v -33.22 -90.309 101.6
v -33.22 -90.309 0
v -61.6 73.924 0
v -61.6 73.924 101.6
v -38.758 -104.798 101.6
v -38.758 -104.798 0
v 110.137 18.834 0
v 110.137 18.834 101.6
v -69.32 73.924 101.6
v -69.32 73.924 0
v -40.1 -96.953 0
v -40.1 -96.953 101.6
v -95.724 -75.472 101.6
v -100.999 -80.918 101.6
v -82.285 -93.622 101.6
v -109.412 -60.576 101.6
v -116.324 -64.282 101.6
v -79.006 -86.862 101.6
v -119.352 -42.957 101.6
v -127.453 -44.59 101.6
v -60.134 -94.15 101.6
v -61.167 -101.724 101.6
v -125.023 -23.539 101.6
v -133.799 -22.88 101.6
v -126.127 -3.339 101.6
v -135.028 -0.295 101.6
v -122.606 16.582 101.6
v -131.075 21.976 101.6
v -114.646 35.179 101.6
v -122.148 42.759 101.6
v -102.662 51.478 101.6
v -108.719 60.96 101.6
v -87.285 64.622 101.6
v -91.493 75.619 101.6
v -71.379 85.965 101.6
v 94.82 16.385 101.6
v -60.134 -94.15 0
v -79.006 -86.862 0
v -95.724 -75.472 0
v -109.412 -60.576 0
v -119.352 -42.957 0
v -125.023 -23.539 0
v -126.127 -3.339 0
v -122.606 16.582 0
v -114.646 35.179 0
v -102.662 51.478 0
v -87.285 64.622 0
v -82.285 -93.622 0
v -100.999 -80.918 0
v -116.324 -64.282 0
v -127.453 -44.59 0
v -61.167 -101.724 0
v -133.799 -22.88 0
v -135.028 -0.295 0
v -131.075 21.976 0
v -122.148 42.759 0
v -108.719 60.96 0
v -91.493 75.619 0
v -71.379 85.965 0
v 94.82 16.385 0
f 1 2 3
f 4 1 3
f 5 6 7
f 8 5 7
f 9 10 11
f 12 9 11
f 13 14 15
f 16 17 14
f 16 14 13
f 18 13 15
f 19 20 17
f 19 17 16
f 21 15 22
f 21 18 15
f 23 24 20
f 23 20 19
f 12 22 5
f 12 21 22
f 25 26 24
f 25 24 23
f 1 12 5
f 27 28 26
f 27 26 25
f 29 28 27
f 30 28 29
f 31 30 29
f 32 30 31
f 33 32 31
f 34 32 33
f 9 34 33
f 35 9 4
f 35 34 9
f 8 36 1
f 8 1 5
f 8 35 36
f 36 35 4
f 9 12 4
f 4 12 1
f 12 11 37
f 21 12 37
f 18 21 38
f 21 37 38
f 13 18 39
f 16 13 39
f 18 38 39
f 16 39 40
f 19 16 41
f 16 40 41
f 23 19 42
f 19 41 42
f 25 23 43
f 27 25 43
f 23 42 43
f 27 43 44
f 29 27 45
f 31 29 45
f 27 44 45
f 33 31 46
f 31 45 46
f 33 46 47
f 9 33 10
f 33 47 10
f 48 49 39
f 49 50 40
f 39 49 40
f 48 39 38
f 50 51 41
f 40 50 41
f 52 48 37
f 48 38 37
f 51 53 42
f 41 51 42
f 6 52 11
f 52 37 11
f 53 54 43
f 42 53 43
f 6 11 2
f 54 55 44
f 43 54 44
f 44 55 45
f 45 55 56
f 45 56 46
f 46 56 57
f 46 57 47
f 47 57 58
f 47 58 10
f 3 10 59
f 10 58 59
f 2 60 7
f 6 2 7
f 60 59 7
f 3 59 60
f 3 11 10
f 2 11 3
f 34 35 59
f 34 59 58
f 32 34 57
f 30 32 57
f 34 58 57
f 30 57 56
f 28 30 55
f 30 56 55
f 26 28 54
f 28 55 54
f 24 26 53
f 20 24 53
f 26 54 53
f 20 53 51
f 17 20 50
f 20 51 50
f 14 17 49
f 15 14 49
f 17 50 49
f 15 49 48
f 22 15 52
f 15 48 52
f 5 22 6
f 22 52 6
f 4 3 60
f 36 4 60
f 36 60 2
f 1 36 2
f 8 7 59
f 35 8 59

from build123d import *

# Parameters (mm, degrees)
F1_DEPTH = 101.6


with BuildPart() as f1:
    # F0 (on Top) → F1 (new body)
    with BuildSketch(Plane.XY):
        Polygon((-38.758028, -104.798459), (110.137142, 18.833792), (-71.379113, 85.964666), (-69.320055, 73.923605), (-40.099562, -96.953376), align=None)
        Polygon((-61.59973, 73.923605), (94.819585, 16.385128), (-33.219855, -90.308734), align=None, mode=Mode.SUBTRACT)
        with BuildLine():
            ThreePointArc((-71.379113, 85.964666), (-133.798783, -22.880006), (-38.758028, -104.798459))
            Line((-38.758028, -104.798459), (-40.099562, -96.953376))
            ThreePointArc((-40.099562, -96.953376), (-125.023249, -23.538701), (-69.320055, 73.923605))
            Line((-69.320055, 73.923605), (-71.379113, 85.964666))
        make_face()
    extrude(amount=F1_DEPTH)


solid = f1.part
